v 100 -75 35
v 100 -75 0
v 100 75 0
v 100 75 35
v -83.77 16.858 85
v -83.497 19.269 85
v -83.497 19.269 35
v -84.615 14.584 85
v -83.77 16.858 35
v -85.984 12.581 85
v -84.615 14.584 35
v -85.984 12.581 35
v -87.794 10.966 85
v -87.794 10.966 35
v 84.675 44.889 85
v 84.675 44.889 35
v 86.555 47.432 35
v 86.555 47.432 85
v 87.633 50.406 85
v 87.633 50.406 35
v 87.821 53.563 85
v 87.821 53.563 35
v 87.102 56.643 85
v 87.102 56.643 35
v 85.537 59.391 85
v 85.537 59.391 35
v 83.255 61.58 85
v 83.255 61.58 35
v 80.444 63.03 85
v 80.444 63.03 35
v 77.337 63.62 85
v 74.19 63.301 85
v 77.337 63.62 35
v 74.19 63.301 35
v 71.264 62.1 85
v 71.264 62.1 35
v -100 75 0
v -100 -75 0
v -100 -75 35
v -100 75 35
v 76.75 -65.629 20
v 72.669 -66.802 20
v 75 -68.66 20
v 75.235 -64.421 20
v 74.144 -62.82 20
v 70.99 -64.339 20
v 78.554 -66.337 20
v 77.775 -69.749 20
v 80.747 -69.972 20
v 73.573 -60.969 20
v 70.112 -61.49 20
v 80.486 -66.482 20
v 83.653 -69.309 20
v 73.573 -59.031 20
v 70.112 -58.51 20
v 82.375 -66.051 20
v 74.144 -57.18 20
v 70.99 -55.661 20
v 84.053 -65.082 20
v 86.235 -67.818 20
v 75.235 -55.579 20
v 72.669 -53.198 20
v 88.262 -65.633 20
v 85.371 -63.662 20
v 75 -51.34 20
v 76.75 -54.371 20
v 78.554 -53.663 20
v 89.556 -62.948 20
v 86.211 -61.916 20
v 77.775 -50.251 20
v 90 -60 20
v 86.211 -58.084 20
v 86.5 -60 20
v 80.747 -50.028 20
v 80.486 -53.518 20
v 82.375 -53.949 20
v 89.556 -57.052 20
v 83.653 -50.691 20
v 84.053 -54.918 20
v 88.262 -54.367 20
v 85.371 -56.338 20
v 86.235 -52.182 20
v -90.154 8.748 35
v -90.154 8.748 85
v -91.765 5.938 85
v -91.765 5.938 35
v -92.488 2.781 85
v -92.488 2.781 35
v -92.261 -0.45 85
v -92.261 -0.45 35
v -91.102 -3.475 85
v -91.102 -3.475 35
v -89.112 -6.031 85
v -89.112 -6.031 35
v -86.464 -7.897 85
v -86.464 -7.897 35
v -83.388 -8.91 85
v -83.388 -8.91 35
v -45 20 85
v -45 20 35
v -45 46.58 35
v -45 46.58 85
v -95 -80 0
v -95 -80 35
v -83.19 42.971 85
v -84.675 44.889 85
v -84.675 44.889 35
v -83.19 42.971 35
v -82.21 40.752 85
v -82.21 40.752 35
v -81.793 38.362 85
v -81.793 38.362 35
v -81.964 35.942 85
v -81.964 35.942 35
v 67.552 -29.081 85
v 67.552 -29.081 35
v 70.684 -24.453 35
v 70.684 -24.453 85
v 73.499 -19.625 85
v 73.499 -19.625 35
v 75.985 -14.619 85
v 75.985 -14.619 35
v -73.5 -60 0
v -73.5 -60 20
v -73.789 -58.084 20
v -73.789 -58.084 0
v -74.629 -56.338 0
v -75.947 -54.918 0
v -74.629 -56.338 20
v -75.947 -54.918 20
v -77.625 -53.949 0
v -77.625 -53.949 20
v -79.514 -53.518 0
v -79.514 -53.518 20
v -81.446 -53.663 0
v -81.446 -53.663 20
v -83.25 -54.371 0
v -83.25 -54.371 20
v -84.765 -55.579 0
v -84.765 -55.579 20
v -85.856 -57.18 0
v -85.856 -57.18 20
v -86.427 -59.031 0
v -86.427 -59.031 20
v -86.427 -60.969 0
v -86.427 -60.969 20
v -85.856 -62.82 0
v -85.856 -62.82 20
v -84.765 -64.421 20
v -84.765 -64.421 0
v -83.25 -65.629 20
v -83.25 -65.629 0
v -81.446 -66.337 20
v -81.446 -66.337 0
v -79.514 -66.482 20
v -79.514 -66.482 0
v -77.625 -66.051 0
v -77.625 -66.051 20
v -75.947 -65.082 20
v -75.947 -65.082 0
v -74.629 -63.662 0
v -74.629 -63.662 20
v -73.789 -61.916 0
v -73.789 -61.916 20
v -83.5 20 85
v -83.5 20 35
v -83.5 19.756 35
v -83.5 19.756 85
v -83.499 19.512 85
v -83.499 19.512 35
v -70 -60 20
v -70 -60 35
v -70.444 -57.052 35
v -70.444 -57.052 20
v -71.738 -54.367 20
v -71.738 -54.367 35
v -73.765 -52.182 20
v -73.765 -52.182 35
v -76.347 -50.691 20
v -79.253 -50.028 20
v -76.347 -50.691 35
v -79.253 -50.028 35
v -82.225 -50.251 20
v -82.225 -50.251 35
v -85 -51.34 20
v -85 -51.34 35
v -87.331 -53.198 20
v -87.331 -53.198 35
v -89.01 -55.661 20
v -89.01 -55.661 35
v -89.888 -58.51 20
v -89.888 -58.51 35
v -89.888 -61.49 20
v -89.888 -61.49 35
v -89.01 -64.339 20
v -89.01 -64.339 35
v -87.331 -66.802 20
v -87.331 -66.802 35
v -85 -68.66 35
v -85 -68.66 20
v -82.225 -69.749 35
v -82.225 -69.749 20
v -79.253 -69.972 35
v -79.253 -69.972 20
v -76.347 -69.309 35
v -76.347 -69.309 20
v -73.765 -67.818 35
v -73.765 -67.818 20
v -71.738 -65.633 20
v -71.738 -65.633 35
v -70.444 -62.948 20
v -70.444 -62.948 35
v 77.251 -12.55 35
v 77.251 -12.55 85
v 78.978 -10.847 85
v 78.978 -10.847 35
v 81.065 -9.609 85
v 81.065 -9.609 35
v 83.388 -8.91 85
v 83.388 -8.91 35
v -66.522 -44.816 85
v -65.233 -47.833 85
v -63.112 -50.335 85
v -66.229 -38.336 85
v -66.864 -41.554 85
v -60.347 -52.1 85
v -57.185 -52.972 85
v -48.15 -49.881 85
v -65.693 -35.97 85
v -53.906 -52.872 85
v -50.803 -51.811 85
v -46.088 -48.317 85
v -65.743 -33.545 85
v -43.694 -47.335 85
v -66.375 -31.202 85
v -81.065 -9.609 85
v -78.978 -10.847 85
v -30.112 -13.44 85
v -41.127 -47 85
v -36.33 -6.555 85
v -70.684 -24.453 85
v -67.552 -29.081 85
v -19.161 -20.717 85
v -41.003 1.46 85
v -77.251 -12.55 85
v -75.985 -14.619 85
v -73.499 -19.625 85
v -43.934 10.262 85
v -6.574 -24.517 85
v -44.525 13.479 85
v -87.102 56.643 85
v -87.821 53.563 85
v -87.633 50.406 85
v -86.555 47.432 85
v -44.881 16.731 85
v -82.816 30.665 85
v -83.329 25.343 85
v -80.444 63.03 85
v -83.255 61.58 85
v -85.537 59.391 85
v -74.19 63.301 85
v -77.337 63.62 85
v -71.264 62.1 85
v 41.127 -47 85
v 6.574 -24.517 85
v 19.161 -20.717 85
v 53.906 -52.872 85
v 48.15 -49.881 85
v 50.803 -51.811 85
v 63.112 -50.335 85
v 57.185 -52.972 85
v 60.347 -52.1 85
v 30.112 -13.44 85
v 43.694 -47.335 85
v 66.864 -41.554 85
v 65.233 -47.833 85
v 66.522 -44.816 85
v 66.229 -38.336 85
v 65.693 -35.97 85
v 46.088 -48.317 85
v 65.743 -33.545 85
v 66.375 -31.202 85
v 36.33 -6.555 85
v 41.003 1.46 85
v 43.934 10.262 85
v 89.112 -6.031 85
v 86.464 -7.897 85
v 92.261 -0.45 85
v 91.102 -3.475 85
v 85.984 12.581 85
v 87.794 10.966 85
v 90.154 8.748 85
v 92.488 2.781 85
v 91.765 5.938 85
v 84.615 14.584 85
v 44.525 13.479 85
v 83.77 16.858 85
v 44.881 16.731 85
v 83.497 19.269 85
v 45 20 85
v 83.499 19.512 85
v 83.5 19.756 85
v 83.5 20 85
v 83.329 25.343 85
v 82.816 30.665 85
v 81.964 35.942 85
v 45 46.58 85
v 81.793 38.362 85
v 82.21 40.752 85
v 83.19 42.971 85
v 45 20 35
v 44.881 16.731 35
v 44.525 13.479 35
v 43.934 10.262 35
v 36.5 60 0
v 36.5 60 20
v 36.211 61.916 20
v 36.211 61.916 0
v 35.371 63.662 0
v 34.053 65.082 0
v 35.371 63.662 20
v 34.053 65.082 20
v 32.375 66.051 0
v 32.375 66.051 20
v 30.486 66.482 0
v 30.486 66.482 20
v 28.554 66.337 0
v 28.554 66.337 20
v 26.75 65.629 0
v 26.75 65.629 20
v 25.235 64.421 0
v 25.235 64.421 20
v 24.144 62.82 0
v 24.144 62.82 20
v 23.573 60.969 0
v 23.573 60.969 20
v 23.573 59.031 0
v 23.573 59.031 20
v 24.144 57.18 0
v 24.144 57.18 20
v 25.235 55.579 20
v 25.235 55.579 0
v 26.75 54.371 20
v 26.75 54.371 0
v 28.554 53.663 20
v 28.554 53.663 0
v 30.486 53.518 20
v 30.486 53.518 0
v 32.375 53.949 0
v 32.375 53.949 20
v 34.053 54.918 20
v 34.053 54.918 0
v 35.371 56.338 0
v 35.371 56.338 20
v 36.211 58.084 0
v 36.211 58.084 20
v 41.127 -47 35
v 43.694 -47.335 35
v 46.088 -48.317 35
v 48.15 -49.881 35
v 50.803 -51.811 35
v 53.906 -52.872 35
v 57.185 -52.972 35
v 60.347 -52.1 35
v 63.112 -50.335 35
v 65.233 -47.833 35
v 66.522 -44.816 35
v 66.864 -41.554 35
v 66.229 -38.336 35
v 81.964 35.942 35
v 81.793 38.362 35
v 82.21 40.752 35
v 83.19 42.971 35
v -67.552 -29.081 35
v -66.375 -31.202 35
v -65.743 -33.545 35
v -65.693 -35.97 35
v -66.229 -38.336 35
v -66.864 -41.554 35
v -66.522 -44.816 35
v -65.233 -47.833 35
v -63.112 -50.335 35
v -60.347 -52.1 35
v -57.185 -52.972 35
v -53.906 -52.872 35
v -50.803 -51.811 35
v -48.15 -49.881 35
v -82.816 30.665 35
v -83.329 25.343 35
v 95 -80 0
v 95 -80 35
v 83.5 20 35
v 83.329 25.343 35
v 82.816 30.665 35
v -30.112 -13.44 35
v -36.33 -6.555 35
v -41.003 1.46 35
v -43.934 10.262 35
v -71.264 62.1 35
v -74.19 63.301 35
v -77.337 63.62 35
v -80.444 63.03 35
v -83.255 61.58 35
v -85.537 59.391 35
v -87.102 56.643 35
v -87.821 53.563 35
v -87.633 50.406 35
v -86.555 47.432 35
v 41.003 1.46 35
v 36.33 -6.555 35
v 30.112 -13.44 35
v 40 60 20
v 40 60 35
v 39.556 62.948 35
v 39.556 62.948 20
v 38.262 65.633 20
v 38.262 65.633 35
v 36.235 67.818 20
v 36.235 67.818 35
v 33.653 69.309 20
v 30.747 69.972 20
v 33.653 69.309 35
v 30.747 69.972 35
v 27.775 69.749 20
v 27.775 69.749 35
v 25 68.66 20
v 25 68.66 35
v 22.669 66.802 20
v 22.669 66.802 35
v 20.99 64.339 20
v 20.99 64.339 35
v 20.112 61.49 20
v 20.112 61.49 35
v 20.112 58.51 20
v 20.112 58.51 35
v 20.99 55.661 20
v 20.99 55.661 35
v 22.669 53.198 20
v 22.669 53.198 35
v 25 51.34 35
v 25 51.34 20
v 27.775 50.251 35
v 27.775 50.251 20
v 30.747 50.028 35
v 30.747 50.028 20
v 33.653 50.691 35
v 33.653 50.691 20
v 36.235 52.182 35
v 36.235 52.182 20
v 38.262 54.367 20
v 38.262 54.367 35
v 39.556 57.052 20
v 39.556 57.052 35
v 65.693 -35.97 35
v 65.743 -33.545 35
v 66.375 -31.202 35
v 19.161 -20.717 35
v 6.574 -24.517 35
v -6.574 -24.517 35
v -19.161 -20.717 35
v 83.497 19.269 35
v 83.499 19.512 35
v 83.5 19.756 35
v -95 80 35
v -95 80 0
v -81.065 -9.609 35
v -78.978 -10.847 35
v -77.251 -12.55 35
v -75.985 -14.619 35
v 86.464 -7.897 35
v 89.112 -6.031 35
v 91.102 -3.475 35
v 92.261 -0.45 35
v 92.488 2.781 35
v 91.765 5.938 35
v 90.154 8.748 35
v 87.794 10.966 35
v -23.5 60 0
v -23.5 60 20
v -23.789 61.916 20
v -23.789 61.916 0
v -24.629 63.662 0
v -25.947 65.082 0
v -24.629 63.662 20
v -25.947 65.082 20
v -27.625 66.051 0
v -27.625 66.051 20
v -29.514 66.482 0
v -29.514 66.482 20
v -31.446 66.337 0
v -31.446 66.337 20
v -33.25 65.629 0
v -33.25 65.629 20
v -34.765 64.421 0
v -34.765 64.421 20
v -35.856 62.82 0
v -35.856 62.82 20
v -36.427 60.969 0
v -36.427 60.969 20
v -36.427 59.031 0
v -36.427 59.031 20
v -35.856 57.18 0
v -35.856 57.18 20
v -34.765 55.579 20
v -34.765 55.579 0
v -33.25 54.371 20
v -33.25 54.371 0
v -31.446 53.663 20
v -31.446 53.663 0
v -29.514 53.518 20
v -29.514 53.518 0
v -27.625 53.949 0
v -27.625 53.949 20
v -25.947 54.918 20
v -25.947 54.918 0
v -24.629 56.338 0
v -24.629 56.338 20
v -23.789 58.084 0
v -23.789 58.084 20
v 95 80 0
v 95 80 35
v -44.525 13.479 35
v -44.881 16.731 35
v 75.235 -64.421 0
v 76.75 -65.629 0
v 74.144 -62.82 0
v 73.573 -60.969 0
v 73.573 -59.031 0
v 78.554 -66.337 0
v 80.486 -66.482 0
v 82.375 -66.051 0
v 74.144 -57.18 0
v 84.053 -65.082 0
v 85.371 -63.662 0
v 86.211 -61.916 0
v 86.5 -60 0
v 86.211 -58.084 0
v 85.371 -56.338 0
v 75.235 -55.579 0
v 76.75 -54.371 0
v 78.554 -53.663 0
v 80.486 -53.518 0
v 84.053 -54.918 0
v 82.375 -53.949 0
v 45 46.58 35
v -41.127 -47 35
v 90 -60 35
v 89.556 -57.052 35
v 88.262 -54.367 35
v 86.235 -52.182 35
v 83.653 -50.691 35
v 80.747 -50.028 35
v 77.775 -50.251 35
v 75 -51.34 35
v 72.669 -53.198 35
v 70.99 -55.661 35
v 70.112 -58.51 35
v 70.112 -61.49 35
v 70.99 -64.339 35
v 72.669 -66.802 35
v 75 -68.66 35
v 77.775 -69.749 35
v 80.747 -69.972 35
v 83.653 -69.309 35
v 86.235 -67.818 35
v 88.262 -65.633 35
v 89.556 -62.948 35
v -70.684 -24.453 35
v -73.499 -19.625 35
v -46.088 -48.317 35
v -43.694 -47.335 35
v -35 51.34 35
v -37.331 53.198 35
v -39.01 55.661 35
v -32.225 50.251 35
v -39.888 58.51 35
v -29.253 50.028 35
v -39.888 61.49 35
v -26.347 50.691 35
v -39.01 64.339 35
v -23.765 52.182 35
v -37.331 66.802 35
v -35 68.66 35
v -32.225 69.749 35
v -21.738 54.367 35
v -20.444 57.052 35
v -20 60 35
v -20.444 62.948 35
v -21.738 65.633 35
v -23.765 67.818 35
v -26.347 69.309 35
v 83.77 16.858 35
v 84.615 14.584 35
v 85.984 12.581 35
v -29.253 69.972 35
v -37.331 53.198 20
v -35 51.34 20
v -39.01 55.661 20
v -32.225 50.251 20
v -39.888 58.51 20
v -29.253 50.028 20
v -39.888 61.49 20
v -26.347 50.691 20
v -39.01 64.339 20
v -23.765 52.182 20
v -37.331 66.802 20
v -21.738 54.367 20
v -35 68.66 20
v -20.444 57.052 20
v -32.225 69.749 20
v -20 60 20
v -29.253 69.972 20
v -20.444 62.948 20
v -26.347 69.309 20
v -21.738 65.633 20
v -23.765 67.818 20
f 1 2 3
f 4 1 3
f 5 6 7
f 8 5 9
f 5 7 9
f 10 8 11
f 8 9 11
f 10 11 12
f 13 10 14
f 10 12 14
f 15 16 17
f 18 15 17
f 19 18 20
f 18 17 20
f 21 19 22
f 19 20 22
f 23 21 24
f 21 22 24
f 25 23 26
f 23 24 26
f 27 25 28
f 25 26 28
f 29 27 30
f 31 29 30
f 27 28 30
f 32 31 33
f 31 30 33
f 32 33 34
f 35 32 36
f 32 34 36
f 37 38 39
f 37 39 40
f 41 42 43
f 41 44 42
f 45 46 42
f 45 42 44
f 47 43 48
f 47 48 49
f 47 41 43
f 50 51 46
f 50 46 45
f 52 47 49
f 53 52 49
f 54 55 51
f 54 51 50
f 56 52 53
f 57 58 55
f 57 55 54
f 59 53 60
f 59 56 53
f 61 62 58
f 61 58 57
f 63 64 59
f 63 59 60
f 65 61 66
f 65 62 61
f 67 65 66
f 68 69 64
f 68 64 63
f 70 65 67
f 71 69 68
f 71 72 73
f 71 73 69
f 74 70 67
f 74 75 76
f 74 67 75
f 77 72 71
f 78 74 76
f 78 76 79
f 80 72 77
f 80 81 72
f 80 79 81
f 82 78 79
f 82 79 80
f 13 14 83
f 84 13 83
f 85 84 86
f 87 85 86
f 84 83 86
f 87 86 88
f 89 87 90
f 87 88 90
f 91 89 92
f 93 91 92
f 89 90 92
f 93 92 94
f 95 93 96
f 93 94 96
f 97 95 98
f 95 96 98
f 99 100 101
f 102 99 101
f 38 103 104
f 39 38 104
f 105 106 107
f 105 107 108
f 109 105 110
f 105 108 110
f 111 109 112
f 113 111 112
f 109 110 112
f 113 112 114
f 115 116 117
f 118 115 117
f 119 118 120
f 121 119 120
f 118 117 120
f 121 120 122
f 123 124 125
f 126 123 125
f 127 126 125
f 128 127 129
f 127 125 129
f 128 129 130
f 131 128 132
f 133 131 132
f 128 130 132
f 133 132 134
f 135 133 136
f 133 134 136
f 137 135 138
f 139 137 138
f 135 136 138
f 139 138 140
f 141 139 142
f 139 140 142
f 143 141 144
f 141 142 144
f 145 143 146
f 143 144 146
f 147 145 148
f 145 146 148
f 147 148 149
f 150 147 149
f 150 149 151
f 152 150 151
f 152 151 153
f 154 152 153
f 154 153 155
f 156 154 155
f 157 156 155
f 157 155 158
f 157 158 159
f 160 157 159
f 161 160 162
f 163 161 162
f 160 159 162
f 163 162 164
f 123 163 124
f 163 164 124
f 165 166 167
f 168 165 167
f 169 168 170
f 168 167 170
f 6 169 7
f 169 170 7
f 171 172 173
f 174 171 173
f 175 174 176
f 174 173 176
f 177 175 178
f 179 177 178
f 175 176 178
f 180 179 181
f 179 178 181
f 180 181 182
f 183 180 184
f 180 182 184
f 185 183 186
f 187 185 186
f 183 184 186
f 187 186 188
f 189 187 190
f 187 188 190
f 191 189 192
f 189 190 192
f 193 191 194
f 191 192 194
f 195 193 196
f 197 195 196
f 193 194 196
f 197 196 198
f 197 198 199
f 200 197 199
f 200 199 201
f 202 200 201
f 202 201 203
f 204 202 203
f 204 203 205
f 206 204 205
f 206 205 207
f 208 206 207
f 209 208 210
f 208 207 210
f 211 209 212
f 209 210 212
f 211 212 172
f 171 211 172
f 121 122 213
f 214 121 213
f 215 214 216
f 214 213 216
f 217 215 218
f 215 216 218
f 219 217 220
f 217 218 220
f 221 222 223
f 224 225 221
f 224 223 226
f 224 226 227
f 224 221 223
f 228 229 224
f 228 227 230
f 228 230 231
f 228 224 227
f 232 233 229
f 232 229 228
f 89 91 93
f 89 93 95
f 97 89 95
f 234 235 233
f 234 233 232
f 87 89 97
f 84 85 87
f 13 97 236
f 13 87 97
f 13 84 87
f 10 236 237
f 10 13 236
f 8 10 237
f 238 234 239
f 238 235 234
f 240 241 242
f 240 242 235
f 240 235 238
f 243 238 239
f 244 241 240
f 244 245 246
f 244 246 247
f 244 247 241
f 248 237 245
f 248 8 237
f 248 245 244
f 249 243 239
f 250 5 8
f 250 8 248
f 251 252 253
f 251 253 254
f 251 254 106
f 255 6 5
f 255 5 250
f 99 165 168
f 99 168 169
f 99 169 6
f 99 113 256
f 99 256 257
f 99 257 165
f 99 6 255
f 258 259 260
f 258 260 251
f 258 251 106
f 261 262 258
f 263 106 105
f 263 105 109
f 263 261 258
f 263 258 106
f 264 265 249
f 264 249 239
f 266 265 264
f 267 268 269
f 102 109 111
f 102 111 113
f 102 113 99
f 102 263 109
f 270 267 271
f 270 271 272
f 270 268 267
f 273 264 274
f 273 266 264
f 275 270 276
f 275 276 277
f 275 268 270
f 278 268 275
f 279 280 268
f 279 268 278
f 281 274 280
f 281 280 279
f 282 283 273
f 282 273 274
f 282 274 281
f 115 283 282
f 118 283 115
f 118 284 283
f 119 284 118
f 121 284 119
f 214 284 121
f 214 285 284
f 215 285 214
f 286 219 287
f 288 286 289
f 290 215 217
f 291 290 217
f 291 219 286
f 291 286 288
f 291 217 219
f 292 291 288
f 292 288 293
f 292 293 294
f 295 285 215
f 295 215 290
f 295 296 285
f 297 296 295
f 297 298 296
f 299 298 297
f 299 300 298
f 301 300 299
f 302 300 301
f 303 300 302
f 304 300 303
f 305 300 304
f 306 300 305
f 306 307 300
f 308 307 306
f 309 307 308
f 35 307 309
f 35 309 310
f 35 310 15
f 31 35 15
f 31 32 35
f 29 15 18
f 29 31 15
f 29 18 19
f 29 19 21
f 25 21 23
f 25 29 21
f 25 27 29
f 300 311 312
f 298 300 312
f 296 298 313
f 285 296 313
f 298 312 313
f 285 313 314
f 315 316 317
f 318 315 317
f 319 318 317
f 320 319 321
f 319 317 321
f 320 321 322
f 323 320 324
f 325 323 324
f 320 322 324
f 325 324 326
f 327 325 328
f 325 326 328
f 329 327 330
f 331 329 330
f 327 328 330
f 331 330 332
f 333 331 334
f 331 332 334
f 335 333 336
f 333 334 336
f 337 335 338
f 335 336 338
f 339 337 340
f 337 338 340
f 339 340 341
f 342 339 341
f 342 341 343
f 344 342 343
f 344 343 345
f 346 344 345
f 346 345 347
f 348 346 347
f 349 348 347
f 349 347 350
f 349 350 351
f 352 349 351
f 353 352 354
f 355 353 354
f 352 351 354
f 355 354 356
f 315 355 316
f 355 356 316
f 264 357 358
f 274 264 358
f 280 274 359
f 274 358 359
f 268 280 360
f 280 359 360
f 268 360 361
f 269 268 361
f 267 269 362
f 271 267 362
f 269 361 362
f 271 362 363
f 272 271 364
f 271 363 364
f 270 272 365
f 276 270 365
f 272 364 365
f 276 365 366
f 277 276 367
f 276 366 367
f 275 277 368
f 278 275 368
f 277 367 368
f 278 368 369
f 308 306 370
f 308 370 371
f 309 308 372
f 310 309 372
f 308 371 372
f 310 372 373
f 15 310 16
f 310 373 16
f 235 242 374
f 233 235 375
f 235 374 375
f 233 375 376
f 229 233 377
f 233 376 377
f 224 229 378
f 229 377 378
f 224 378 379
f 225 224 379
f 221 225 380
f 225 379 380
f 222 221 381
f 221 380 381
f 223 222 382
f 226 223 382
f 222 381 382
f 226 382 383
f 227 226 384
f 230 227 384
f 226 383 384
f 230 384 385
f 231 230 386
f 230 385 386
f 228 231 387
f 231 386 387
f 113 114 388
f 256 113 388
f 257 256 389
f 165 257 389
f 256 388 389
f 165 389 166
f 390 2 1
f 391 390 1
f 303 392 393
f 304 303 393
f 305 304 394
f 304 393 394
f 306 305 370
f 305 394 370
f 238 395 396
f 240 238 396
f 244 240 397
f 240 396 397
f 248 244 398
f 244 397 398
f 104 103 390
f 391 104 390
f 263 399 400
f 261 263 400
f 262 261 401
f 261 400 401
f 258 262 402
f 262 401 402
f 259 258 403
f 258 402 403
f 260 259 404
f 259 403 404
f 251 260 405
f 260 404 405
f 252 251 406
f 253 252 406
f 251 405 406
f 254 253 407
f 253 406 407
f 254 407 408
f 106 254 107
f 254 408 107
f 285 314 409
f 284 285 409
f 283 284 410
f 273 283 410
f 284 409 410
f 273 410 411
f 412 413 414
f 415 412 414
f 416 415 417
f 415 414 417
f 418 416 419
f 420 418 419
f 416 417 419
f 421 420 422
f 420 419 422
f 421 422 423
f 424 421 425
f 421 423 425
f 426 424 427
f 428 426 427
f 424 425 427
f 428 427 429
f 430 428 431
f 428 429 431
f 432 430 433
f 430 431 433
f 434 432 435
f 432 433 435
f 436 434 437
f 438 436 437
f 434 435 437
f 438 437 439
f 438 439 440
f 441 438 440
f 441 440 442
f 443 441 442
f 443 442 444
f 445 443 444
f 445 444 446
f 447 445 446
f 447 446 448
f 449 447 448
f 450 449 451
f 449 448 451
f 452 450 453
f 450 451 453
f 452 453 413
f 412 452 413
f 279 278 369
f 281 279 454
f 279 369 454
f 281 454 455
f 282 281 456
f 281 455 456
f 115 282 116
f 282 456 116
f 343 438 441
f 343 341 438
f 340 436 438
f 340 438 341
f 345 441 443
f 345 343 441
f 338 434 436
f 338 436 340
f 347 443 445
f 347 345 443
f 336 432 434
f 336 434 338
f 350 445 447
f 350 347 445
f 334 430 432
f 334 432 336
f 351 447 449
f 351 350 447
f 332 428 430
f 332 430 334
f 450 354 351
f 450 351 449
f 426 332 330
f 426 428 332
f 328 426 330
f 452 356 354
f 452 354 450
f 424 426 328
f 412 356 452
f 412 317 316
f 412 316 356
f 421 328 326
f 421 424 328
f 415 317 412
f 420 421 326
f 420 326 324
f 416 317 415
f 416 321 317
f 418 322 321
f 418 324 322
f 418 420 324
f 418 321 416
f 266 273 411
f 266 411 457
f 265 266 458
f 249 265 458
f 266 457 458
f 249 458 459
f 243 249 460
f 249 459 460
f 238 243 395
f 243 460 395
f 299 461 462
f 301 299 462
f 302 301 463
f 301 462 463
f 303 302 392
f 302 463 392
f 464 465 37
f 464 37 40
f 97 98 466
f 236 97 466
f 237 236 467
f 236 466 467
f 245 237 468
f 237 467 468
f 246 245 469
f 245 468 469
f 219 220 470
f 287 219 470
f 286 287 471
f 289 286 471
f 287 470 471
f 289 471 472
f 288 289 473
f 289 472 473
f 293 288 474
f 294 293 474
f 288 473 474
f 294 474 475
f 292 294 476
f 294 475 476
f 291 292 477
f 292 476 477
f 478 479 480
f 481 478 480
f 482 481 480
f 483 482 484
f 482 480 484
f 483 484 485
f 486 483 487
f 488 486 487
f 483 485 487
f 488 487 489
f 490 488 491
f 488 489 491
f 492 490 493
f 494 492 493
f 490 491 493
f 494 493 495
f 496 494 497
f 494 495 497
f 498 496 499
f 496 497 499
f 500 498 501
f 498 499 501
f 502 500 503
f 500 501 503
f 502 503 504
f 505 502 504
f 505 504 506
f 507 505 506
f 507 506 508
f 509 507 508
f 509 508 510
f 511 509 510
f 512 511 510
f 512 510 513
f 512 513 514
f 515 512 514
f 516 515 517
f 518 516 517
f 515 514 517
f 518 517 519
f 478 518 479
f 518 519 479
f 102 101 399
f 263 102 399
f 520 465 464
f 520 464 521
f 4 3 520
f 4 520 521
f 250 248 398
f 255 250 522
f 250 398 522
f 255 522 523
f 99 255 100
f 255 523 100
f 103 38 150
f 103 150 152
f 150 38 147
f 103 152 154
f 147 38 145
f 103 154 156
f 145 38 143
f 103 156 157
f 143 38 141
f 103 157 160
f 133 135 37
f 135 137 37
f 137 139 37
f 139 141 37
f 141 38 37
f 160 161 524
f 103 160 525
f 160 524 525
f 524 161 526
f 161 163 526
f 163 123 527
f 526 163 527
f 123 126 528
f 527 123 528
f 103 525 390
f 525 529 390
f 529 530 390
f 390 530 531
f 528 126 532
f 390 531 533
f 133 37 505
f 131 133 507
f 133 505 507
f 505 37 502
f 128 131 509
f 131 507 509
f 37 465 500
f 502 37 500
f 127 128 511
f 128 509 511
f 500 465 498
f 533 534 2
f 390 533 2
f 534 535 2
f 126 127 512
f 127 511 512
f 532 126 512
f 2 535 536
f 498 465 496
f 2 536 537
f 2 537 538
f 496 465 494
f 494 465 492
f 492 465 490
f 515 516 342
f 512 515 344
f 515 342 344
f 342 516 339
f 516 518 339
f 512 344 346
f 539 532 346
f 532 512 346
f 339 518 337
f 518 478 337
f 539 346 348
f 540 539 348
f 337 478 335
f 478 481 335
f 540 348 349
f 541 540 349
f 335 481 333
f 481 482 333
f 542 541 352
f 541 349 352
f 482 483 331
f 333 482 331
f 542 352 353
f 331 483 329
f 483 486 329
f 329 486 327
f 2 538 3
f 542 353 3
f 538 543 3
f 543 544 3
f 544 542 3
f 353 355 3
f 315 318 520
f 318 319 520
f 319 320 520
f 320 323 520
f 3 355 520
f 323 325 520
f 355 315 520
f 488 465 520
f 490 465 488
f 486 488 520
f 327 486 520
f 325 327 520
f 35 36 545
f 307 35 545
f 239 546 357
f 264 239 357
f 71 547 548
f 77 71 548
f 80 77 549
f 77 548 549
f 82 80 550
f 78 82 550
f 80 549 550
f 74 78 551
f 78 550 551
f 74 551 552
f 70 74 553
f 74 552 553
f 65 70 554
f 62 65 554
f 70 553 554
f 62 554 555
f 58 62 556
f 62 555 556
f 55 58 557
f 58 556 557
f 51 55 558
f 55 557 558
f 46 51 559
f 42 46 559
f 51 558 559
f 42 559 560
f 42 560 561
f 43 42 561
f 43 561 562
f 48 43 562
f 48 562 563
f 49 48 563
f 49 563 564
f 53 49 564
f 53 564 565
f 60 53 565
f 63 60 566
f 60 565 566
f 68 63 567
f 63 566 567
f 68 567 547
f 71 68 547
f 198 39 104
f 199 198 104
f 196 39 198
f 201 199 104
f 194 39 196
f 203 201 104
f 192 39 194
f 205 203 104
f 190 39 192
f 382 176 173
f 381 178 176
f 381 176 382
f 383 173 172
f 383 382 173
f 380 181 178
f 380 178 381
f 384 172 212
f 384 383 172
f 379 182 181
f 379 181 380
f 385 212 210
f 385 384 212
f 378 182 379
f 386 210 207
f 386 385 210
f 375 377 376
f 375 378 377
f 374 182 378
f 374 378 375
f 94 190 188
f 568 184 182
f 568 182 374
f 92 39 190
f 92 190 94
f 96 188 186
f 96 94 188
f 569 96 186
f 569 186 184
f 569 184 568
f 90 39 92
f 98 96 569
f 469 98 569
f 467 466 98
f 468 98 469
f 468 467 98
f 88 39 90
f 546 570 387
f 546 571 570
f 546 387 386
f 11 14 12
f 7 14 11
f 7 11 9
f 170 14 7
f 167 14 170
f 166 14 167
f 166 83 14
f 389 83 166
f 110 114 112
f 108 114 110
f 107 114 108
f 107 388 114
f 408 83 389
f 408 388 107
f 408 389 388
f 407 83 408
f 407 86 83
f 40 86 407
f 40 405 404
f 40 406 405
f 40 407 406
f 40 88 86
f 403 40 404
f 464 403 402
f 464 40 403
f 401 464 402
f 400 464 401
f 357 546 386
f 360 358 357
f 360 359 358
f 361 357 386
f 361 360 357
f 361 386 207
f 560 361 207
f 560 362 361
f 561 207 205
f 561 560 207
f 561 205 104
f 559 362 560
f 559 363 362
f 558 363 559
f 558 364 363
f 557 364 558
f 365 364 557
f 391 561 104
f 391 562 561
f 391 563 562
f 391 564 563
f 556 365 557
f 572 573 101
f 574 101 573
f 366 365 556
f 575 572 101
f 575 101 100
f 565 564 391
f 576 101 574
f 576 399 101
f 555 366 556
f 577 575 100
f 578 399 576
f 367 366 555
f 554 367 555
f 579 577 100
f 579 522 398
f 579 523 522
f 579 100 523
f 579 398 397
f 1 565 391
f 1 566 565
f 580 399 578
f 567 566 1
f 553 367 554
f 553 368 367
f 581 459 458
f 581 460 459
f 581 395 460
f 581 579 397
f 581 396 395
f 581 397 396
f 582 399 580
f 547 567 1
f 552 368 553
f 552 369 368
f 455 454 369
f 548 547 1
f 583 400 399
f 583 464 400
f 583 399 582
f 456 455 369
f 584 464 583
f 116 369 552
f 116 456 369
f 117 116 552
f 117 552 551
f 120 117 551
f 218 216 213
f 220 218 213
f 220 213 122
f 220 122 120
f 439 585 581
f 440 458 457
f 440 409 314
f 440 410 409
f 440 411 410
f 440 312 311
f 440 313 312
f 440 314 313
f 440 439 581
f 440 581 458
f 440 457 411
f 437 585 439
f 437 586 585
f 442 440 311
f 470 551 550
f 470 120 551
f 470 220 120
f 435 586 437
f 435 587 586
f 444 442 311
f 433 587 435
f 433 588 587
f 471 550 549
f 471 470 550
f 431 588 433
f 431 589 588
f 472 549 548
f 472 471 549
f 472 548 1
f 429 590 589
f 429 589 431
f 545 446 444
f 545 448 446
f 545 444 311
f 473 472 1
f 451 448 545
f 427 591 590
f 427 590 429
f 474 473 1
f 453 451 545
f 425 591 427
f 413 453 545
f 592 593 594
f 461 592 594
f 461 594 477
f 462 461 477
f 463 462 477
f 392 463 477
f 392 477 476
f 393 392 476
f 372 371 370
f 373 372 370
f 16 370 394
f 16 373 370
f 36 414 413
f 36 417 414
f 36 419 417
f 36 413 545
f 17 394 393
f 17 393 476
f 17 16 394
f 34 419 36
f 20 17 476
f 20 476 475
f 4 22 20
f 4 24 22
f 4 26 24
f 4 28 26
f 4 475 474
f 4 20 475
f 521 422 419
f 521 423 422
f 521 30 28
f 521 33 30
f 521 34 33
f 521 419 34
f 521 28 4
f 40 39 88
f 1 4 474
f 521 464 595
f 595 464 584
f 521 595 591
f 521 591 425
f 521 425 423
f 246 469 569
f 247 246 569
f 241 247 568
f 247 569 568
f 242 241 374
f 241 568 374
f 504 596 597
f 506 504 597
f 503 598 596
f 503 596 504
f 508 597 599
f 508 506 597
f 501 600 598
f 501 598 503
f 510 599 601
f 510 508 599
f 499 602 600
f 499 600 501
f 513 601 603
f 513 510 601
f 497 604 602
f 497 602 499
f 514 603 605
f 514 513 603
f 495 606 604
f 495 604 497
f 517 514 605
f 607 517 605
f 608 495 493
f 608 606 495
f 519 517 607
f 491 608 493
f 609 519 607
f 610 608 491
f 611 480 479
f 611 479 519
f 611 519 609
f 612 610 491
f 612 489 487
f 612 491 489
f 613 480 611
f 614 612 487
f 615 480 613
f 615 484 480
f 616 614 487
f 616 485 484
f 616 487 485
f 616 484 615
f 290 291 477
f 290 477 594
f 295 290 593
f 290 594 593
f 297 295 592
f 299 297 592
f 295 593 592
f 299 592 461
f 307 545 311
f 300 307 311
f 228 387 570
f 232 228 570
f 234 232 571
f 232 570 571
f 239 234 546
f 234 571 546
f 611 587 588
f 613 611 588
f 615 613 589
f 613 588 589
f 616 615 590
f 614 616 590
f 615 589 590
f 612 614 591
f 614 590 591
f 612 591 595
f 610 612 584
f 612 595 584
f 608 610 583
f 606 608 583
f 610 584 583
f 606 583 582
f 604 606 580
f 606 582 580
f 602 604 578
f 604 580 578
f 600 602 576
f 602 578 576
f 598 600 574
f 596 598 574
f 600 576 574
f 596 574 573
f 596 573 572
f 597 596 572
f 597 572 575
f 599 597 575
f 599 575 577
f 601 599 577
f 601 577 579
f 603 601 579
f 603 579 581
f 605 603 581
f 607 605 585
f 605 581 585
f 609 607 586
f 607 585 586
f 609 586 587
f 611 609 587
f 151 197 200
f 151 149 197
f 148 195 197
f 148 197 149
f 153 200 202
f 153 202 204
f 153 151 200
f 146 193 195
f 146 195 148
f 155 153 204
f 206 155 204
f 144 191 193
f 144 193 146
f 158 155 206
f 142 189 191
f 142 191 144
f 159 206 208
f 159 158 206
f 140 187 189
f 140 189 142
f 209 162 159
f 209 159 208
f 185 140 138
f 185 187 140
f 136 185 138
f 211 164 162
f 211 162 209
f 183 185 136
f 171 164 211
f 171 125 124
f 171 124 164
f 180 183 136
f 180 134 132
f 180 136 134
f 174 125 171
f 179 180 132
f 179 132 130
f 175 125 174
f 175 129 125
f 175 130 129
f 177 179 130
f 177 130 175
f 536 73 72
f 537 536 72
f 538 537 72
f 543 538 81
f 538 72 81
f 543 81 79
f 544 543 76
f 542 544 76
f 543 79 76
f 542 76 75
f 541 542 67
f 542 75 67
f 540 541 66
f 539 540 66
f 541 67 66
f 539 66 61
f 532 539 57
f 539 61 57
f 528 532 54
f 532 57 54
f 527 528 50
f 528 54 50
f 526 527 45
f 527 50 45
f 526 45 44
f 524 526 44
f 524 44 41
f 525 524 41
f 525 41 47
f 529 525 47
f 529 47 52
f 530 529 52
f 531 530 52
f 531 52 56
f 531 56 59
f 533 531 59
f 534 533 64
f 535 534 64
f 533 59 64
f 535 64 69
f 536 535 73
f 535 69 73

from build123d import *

# Parameters (mm, degrees)
F0_W     = 200
F0_H     = 160
F1_DEPTH = 35
F3_DEPTH = 50
F4_SIZE  = 5
F5_R     = 10
F6_DEPTH = 15
F7_R     = 6.5
F8_DEPTH = 20


with BuildPart() as f1:
    # F0 (on Top) → F1 (new body)
    with BuildSketch(Plane.XY):
        Rectangle(F0_W, F0_H)
    extrude(amount=F1_DEPTH)

    # F2 (on face) → F3 (join)
    with BuildSketch(Plane.XY.offset(35)):
        with BuildLine():
            Line((-45, 20), (-83.5, 20))
            ThreePointArc((-83.5, 20), (-83.499199, 19.634294), (-83.496797, 19.268595))
            ThreePointArc((-83.496797, 19.268595), (-84.615489, 14.584353), (-87.793986, 10.966239))
            ThreePointArc((-87.793986, 10.966239), (-92.260652, -0.450479), (-83.388126, -8.910435))
            ThreePointArc((-83.388126, -8.910435), (-78.978477, -10.846561), (-75.985202, -14.619346))
            ThreePointArc((-75.985202, -14.619346), (-72.131939, -22.062255), (-67.551957, -29.081393))
            ThreePointArc((-67.551957, -29.081393), (-65.742607, -33.544559), (-66.229285, -38.335879))
            ThreePointArc((-66.229285, -38.335879), (-61.795593, -51.32092), (-48.150249, -49.880952))
            ThreePointArc((-48.150249, -49.880952), (-44.922849, -47.748231), (-41.127489, -47))
            Line((-41.127489, -47), (41.127489, -47))
            ThreePointArc((41.127489, -47), (44.922849, -47.748231), (48.150249, -49.880952))
            ThreePointArc((48.150249, -49.880952), (61.795593, -51.32092), (66.229285, -38.335879))
            ThreePointArc((66.229285, -38.335879), (65.742607, -33.544559), (67.551957, -29.081393))
            ThreePointArc((67.551957, -29.081393), (72.131939, -22.062255), (75.985202, -14.619346))
            ThreePointArc((75.985202, -14.619346), (78.978477, -10.846561), (83.388126, -8.910435))
            ThreePointArc((83.388126, -8.910435), (92.260652, -0.450479), (87.793986, 10.966239))
            ThreePointArc((87.793986, 10.966239), (84.615489, 14.584353), (83.496797, 19.268595))
            ThreePointArc((83.496797, 19.268595), (83.499199, 19.634294), (83.5, 20))
            Line((83.5, 20), (45, 20))
            ThreePointArc((45, 20), (44.732617, 15.101734), (43.933644, 10.261677))
            ThreePointArc((43.933644, 10.261677), (38.8735, -2.668281), (30.112429, -13.44012))
            ThreePointArc((30.112429, -13.44012), (0, -25), (-30.112429, -13.44012))
            ThreePointArc((-30.112429, -13.44012), (-38.8735, -2.668281), (-43.933644, 10.261677))
            ThreePointArc((-43.933644, 10.261677), (-44.732617, 15.101734), (-45, 20))
        make_face()
        with BuildLine():
            ThreePointArc((-84.67549, 44.888838), (-82.209915, 40.751866), (-81.963998, 35.942175))
            ThreePointArc((-81.963998, 35.942175), (-83.115113, 28.008), (-83.5, 20))
            Line((-83.5, 20), (-45, 20))
            Line((-45, 20), (-45, 39.104097))
            Line((-45, 39.104097), (-45, 46.58))
            Line((-45, 46.58), (-71.264379, 62.100147))
            ThreePointArc((-71.264379, 62.100147), (-85.537354, 59.391052), (-84.67549, 44.888838))
        make_face()
        with BuildLine():
            Line((45, 39.104097), (45, 20))
            Line((45, 20), (83.5, 20))
            ThreePointArc((83.5, 20), (83.115113, 28.008), (81.963998, 35.942175))
            ThreePointArc((81.963998, 35.942175), (82.209915, 40.751866), (84.67549, 44.888838))
            ThreePointArc((84.67549, 44.888838), (85.537354, 59.391052), (71.264379, 62.100147))
            Line((71.264379, 62.100147), (45, 46.58))
            Line((45, 46.58), (45, 39.104097))
        make_face()
        with BuildLine():
            Line((67.673667, 46.58), (62.609608, 46.58))
            Line((62.609608, 46.58), (66.735146, 48.331437))
            ThreePointArc((66.735146, 48.331437), (67.164778, 47.434483), (67.673667, 46.58))
        make_face(mode=Mode.SUBTRACT)
        with BuildLine():
            Line((66.735146, 48.331437), (62.609608, 46.58))
            Line((62.609608, 46.58), (67.673667, 46.58))
            ThreePointArc((67.673667, 46.58), (67.164778, 47.434483), (66.735146, 48.331437))
        make_face()
    extrude(amount=F3_DEPTH)

    # F4
    f4_edges = [f1.edges().sort_by_distance(p)[0] for p in [
        (100, -80, 17.5),
        (100, 80, 17.5),
        (-100, 80, 17.5),
        (-100, -80, 17.5),
    ]]
    chamfer(f4_edges, length=F4_SIZE)

    # F5 (on face) → F6 (cut)
    with BuildSketch(Plane.XY.offset(35)):
        with Locations((-80, -60)):
            Circle(F5_R)
        with Locations((80, -60)):
            Circle(F5_R)
        with Locations((-30, 60)):
            Circle(F5_R)
        with Locations((30, 60)):
            Circle(F5_R)
    extrude(amount=-F6_DEPTH, mode=Mode.SUBTRACT)

    # F7 (on face) → F8 (cut)
    with BuildSketch(Plane.XY.offset(20)):
        with Locations((-30, 60)):
            Circle(F7_R)
        with Locations((30, 60)):
            Circle(F7_R)
        with Locations((-80, -60)):
            Circle(F7_R)
        with Locations((80, -60)):
            Circle(F7_R)
    extrude(amount=-F8_DEPTH, mode=Mode.SUBTRACT)


solid = f1.part
